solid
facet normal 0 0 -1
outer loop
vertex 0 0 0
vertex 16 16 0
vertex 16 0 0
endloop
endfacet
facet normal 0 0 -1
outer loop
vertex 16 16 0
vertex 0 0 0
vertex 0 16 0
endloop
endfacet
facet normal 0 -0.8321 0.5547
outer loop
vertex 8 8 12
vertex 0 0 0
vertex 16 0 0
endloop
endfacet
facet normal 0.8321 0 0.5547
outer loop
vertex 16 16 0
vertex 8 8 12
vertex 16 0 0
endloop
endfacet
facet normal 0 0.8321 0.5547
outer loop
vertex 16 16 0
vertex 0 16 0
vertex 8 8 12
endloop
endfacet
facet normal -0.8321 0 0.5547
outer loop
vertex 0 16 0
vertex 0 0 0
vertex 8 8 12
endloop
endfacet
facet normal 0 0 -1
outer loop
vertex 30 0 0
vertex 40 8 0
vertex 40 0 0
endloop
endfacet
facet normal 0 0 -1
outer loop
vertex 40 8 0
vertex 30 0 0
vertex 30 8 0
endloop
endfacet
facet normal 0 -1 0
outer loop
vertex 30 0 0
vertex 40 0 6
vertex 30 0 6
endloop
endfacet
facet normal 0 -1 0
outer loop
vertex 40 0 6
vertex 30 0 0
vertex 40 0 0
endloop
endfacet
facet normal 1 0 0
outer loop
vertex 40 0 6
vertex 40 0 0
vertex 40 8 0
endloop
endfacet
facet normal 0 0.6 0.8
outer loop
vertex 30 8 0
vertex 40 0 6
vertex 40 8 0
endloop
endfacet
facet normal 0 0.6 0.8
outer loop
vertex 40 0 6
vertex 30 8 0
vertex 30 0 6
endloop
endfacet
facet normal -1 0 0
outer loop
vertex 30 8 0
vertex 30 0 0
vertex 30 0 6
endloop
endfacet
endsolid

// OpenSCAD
// polyhedron: a square pyramid plus a wedge, sewn from face lists
polyhedron(
    points = [[0, 0, 0], [16, 0, 0], [16, 16, 0], [0, 16, 0], [8, 8, 12]],
    faces = [[0, 3, 2, 1], [0, 1, 4], [1, 2, 4], [2, 3, 4], [3, 0, 4]]
);
translate([30, 0, 0]) polyhedron(
    points = [[0, 0, 0], [10, 0, 0], [10, 8, 0], [0, 8, 0], [0, 0, 6], [10, 0, 6]],
    faces = [[0, 3, 2, 1], [0, 1, 5, 4], [1, 2, 5], [2, 3, 4, 5], [3, 0, 4]]
);
